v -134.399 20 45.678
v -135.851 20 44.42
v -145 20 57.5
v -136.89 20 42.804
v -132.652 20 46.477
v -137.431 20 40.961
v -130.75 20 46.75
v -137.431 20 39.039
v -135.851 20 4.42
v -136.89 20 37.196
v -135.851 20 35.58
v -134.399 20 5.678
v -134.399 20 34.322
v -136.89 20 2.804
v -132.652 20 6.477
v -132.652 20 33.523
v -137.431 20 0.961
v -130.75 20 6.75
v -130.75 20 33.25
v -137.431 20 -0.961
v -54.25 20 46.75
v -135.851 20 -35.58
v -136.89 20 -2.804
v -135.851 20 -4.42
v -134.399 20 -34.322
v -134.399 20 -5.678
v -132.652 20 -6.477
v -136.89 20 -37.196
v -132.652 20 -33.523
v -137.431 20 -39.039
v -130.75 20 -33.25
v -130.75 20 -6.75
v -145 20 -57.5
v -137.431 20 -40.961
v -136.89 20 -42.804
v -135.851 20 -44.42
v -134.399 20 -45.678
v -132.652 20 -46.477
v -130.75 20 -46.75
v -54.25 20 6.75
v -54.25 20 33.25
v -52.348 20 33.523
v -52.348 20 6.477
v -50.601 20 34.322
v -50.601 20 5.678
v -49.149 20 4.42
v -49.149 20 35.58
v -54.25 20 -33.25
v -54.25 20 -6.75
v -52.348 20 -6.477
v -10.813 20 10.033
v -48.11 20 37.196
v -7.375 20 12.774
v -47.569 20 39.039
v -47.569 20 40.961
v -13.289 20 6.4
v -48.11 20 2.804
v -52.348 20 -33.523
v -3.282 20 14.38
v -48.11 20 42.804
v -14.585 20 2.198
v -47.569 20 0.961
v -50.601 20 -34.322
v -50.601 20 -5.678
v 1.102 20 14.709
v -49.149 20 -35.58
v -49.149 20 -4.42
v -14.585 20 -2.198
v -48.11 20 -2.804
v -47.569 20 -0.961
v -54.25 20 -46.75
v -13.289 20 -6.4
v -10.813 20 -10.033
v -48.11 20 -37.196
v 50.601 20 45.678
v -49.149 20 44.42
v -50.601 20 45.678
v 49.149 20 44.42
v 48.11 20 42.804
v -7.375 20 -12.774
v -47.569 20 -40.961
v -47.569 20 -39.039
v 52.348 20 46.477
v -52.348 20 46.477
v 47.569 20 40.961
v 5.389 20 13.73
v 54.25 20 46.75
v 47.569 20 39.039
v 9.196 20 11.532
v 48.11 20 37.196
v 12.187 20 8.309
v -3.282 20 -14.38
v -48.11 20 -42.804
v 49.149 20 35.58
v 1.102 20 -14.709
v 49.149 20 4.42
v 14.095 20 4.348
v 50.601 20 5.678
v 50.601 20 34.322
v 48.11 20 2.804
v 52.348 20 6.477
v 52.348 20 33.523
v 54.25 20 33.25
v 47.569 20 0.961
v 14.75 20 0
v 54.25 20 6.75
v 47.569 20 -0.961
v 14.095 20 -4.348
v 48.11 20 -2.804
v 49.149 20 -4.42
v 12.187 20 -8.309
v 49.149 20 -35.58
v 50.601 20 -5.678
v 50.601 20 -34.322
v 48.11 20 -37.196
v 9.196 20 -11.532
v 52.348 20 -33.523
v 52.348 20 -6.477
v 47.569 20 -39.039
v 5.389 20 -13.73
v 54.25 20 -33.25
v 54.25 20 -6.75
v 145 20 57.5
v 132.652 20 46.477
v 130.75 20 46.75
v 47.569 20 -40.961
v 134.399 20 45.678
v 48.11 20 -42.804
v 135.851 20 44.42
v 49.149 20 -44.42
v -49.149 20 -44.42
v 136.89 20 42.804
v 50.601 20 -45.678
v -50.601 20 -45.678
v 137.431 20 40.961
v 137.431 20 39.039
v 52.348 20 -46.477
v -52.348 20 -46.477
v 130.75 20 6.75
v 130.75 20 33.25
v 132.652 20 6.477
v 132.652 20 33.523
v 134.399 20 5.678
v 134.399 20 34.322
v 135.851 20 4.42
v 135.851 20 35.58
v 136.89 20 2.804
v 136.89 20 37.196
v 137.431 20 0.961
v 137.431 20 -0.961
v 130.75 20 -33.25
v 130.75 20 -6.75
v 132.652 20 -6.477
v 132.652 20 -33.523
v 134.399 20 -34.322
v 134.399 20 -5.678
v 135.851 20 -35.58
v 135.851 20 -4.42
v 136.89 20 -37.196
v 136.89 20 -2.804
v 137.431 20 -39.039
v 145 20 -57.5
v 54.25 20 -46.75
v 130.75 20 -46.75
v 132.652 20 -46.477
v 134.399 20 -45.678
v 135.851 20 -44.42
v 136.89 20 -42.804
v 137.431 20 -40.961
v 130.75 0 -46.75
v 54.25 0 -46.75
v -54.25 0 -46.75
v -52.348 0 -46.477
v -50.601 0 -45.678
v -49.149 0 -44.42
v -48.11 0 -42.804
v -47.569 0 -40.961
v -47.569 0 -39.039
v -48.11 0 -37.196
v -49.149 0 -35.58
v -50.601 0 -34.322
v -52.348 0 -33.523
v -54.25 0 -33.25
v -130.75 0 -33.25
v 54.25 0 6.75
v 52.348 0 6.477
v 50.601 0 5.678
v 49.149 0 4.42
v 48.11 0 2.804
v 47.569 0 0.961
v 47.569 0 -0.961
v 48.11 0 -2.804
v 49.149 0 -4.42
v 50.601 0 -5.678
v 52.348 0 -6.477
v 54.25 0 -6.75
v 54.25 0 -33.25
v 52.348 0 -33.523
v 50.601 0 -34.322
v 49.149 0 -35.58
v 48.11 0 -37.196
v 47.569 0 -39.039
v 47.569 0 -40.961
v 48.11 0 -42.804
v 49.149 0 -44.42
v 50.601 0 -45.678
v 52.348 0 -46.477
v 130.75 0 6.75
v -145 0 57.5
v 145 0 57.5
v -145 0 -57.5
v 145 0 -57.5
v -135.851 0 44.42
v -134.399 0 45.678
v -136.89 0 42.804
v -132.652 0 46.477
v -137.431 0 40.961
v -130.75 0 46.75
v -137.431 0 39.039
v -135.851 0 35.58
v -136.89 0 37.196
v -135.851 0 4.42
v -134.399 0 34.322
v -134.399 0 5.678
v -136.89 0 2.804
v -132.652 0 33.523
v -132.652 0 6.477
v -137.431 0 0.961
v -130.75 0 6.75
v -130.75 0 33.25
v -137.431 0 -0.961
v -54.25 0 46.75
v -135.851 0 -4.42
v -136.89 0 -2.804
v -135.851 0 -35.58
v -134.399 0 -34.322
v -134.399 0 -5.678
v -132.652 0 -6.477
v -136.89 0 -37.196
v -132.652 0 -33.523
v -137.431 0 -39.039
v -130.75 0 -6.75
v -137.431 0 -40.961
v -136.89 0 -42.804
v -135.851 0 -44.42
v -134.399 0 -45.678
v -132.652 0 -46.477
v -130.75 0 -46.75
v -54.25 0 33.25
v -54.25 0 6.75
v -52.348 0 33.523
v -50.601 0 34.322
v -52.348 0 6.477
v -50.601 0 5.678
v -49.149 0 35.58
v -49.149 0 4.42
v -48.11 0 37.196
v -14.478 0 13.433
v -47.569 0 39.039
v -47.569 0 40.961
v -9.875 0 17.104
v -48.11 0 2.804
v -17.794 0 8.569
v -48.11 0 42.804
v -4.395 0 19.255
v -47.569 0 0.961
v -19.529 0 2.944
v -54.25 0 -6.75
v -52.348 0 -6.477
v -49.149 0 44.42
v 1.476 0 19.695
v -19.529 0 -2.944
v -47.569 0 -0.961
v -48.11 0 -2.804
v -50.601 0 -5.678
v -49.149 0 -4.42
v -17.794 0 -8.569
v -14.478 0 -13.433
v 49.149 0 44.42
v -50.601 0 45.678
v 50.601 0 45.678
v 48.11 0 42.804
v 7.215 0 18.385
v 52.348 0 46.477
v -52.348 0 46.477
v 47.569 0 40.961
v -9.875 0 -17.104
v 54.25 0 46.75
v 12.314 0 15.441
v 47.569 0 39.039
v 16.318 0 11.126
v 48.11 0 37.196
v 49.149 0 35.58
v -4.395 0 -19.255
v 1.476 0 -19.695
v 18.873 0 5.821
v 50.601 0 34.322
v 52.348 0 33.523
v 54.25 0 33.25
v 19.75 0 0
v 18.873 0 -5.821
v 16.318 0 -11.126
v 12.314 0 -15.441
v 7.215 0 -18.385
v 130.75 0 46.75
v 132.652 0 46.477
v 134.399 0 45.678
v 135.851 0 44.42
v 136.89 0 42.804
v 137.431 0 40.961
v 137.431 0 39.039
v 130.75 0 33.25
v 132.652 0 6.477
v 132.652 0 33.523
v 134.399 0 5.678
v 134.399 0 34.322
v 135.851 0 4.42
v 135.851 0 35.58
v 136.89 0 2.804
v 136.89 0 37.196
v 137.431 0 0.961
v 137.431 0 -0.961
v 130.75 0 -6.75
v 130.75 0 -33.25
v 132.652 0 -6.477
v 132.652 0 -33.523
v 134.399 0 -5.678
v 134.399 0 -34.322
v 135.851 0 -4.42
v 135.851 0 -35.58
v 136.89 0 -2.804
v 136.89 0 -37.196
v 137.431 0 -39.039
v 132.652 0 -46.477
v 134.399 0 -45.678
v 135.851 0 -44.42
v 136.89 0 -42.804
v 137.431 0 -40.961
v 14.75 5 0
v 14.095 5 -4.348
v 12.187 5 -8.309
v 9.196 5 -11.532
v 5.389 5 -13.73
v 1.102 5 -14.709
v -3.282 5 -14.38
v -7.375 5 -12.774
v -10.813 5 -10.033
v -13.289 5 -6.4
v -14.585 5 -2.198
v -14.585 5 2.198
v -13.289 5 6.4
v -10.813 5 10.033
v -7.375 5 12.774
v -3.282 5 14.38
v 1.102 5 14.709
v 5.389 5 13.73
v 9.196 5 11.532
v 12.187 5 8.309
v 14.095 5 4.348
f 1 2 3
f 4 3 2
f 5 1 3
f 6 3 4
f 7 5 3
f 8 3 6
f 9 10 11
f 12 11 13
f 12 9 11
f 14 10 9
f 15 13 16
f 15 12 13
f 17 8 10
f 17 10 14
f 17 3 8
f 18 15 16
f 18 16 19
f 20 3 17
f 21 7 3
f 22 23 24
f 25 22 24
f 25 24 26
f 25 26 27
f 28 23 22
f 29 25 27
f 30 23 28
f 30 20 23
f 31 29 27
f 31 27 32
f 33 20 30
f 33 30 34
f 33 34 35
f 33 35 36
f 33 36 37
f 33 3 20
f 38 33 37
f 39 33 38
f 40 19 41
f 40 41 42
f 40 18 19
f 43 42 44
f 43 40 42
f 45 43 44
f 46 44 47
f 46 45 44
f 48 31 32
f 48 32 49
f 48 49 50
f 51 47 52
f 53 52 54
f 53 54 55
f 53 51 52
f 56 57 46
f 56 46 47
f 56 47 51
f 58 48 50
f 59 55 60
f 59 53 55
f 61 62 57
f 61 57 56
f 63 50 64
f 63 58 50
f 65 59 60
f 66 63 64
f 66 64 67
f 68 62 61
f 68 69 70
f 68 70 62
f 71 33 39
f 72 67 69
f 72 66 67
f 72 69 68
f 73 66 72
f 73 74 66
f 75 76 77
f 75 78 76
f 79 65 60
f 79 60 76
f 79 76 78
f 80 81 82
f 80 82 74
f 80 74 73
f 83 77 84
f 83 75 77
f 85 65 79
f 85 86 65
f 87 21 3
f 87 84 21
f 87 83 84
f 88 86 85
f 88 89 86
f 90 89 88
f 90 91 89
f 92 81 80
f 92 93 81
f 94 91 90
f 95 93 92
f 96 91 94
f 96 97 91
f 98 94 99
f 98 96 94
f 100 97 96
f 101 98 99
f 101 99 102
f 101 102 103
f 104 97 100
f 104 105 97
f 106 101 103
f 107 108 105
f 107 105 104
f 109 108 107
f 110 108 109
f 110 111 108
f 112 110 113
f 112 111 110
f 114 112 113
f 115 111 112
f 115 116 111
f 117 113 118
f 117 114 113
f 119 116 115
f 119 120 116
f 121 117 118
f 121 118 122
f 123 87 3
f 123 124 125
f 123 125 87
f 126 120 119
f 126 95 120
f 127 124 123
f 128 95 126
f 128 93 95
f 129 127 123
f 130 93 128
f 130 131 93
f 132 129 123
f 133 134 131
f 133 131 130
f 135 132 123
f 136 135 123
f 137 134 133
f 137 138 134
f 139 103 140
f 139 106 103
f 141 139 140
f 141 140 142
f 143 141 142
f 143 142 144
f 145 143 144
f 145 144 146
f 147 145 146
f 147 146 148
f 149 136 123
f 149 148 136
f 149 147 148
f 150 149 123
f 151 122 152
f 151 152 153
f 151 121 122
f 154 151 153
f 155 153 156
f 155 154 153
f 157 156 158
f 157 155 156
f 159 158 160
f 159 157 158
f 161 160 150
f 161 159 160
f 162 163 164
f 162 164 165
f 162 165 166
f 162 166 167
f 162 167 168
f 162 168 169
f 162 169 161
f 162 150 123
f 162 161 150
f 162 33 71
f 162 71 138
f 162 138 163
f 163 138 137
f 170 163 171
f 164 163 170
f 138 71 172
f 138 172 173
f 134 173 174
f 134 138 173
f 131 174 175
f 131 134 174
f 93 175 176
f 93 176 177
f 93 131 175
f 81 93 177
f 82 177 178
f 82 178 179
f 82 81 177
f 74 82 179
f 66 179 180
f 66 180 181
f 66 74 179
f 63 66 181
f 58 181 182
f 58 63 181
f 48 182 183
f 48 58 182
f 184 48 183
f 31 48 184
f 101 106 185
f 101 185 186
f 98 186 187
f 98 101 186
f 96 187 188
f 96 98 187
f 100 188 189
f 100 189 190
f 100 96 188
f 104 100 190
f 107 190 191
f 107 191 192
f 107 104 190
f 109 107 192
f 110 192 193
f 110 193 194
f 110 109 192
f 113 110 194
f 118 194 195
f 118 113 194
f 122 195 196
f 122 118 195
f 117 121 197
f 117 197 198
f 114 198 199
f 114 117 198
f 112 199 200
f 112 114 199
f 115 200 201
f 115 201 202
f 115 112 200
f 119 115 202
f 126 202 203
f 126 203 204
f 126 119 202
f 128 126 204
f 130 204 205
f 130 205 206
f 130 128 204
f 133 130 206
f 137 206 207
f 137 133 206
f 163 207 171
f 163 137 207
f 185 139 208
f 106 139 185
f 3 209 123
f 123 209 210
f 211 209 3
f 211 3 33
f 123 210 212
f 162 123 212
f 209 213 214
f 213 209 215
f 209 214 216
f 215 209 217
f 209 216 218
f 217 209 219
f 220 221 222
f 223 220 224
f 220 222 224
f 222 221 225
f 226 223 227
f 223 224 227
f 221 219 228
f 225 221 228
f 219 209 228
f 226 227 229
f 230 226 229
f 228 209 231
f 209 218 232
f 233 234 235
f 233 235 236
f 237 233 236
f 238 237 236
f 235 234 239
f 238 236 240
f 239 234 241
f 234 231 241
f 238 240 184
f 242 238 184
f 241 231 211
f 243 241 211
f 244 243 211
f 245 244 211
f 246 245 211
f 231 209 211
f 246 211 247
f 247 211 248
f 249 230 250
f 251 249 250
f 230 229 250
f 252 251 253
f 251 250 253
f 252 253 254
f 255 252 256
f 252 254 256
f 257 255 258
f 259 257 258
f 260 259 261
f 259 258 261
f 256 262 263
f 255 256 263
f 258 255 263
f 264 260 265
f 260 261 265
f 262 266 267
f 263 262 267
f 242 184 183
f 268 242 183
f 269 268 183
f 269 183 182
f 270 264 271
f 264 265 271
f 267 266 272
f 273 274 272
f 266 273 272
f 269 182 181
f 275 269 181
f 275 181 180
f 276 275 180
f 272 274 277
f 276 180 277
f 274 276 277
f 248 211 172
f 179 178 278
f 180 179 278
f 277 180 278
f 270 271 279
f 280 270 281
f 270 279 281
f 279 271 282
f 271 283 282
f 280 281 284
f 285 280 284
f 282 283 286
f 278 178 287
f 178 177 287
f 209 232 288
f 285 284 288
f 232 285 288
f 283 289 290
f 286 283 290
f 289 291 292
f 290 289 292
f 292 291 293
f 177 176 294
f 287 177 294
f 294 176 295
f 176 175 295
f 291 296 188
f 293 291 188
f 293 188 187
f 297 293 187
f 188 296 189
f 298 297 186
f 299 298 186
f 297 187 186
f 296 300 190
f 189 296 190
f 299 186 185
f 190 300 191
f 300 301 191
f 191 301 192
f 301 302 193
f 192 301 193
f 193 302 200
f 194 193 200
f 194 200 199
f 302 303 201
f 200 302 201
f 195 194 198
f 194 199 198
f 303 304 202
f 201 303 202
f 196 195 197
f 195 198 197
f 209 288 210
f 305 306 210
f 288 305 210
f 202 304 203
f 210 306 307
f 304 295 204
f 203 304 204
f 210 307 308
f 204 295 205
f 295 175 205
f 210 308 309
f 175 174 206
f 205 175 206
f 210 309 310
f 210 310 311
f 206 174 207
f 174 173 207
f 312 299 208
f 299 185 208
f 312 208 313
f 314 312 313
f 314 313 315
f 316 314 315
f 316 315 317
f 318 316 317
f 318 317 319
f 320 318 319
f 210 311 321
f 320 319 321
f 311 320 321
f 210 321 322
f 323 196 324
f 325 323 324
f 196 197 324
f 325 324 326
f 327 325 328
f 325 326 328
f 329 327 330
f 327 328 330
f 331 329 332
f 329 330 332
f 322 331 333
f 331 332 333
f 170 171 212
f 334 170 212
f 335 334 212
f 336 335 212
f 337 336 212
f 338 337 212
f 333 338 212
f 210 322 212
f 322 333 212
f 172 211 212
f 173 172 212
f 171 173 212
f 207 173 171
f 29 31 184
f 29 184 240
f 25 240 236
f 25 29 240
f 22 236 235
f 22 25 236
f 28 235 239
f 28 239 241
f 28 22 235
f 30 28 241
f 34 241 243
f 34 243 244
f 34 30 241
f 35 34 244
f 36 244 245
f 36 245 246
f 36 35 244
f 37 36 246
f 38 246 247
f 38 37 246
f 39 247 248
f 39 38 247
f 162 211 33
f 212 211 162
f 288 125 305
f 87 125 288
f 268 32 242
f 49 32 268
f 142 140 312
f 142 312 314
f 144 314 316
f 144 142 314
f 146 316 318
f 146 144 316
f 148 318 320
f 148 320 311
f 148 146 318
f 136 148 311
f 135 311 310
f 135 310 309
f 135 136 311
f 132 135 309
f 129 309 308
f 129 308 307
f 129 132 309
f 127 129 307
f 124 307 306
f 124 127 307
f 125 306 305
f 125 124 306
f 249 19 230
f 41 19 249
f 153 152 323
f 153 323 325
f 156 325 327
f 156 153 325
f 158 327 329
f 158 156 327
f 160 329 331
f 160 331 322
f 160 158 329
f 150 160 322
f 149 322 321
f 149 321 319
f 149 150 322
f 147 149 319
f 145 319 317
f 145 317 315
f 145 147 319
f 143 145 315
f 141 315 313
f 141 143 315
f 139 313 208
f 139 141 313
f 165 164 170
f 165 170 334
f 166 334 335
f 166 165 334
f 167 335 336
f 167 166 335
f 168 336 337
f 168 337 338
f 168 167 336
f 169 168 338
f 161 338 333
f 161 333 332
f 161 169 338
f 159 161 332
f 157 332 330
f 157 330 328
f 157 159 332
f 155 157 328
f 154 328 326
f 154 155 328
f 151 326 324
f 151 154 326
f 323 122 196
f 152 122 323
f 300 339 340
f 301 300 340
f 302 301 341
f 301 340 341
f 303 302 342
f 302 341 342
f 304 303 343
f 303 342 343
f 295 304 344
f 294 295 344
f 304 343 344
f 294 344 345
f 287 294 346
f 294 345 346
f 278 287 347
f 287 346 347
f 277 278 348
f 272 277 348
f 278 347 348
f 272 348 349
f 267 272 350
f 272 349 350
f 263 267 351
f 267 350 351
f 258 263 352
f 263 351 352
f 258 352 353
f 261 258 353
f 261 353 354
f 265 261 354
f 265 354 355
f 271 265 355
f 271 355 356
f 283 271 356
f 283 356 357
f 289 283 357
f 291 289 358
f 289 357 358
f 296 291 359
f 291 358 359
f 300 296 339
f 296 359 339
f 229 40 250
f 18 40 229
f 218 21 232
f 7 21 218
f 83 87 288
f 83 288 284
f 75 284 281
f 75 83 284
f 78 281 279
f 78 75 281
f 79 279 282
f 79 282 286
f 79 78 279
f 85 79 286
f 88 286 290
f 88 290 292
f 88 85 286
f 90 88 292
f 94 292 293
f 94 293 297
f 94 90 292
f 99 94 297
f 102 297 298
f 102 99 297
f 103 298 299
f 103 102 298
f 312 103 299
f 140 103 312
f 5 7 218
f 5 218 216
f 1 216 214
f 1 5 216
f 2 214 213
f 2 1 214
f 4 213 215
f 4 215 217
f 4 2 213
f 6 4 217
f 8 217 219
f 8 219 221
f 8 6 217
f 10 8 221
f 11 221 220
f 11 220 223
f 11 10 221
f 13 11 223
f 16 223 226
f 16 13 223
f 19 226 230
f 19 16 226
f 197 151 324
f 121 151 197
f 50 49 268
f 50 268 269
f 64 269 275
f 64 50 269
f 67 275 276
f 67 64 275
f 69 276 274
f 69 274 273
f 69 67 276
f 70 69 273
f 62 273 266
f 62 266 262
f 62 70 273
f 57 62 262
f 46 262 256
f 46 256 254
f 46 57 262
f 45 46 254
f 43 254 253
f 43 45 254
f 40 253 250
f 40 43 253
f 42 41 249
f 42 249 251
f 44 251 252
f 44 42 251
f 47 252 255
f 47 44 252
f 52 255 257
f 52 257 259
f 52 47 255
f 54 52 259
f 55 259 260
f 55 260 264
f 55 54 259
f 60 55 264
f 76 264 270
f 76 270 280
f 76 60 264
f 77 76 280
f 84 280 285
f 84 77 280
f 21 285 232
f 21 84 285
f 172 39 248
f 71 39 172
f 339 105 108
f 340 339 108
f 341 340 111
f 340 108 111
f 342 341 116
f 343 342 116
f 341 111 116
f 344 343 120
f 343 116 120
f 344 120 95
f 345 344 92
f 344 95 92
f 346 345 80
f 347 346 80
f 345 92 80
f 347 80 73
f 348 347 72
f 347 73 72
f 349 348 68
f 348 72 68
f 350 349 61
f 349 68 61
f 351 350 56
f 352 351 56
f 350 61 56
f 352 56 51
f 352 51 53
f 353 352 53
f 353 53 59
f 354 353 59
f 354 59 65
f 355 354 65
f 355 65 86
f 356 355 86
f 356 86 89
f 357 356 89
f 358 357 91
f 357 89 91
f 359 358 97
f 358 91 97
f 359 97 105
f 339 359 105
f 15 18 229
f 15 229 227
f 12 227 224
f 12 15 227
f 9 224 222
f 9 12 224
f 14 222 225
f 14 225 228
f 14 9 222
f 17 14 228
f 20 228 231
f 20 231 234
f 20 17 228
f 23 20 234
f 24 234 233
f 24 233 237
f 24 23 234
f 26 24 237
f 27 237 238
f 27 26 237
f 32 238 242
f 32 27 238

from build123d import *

# Parameters (mm, degrees)
SKETCH1_W           = 290
SKETCH1_H           = 115
BOSS_EXTRUDE1_DEPTH = 20
SKETCH2_R           = 14.75
CUT_EXTRUDE1_DEPTH  = 20
CHAMFER1_SIZE       = 5


with BuildPart() as part:
    # Sketch1 → Boss-Extrude1 (new body)
    with BuildSketch(Plane(origin=(0, 0, 0), x_dir=(1, 0, 0), z_dir=(0, 1, 0))):
        Rectangle(SKETCH1_W, SKETCH1_H)
    extrude(amount=BOSS_EXTRUDE1_DEPTH)

    # Sketch2 → Cut-Extrude1 (cut)
    with BuildSketch(Plane(origin=(0, 20, 0), x_dir=(1, 0, 0), z_dir=(0, 1, 0))):
        Circle(SKETCH2_R)
        with BuildLine():
            Line((-130.75, 6.75), (-54.25, 6.75))
            ThreePointArc((-54.25, 6.75), (-47.5, 0), (-54.25, -6.75))
            Line((-54.25, -6.75), (-130.75, -6.75))
            ThreePointArc((-130.75, -6.75), (-137.5, 0), (-130.75, 6.75))
        make_face()
        with BuildLine():
            Line((-130.75, 46.75), (-54.25, 46.75))
            ThreePointArc((-54.25, 46.75), (-47.5, 40), (-54.25, 33.25))
            Line((-54.25, 33.25), (-130.75, 33.25))
            ThreePointArc((-130.75, 33.25), (-137.5, 40), (-130.75, 46.75))
        make_face()
        with BuildLine():
            Line((-130.75, -33.25), (-54.25, -33.25))
            ThreePointArc((-54.25, -33.25), (-47.5, -40), (-54.25, -46.75))
            Line((-54.25, -46.75), (-130.75, -46.75))
            ThreePointArc((-130.75, -46.75), (-137.5, -40), (-130.75, -33.25))
        make_face()
        with BuildLine():
            Line((54.25, 6.75), (130.75, 6.75))
            ThreePointArc((130.75, 6.75), (137.5, 0), (130.75, -6.75))
            Line((130.75, -6.75), (54.25, -6.75))
            ThreePointArc((54.25, -6.75), (47.5, 0), (54.25, 6.75))
        make_face()
        with BuildLine():
            Line((54.25, -33.25), (130.75, -33.25))
            ThreePointArc((130.75, -33.25), (137.5, -40), (130.75, -46.75))
            Line((130.75, -46.75), (54.25, -46.75))
            ThreePointArc((54.25, -46.75), (47.5, -40), (54.25, -33.25))
        make_face()
        with BuildLine():
            Line((54.25, 46.75), (130.75, 46.75))
            ThreePointArc((130.75, 46.75), (137.5, 40), (130.75, 33.25))
            Line((130.75, 33.25), (54.25, 33.25))
            ThreePointArc((54.25, 33.25), (47.5, 40), (54.25, 46.75))
        make_face()
    extrude(amount=-CUT_EXTRUDE1_DEPTH, mode=Mode.SUBTRACT)

    # Chamfer1
    chamfer1_edges = [part.edges().sort_by_distance(p)[0] for p in [
        (-14.75, 0, 0),
    ]]
    chamfer(chamfer1_edges, length=CHAMFER1_SIZE)


solid = part.part
